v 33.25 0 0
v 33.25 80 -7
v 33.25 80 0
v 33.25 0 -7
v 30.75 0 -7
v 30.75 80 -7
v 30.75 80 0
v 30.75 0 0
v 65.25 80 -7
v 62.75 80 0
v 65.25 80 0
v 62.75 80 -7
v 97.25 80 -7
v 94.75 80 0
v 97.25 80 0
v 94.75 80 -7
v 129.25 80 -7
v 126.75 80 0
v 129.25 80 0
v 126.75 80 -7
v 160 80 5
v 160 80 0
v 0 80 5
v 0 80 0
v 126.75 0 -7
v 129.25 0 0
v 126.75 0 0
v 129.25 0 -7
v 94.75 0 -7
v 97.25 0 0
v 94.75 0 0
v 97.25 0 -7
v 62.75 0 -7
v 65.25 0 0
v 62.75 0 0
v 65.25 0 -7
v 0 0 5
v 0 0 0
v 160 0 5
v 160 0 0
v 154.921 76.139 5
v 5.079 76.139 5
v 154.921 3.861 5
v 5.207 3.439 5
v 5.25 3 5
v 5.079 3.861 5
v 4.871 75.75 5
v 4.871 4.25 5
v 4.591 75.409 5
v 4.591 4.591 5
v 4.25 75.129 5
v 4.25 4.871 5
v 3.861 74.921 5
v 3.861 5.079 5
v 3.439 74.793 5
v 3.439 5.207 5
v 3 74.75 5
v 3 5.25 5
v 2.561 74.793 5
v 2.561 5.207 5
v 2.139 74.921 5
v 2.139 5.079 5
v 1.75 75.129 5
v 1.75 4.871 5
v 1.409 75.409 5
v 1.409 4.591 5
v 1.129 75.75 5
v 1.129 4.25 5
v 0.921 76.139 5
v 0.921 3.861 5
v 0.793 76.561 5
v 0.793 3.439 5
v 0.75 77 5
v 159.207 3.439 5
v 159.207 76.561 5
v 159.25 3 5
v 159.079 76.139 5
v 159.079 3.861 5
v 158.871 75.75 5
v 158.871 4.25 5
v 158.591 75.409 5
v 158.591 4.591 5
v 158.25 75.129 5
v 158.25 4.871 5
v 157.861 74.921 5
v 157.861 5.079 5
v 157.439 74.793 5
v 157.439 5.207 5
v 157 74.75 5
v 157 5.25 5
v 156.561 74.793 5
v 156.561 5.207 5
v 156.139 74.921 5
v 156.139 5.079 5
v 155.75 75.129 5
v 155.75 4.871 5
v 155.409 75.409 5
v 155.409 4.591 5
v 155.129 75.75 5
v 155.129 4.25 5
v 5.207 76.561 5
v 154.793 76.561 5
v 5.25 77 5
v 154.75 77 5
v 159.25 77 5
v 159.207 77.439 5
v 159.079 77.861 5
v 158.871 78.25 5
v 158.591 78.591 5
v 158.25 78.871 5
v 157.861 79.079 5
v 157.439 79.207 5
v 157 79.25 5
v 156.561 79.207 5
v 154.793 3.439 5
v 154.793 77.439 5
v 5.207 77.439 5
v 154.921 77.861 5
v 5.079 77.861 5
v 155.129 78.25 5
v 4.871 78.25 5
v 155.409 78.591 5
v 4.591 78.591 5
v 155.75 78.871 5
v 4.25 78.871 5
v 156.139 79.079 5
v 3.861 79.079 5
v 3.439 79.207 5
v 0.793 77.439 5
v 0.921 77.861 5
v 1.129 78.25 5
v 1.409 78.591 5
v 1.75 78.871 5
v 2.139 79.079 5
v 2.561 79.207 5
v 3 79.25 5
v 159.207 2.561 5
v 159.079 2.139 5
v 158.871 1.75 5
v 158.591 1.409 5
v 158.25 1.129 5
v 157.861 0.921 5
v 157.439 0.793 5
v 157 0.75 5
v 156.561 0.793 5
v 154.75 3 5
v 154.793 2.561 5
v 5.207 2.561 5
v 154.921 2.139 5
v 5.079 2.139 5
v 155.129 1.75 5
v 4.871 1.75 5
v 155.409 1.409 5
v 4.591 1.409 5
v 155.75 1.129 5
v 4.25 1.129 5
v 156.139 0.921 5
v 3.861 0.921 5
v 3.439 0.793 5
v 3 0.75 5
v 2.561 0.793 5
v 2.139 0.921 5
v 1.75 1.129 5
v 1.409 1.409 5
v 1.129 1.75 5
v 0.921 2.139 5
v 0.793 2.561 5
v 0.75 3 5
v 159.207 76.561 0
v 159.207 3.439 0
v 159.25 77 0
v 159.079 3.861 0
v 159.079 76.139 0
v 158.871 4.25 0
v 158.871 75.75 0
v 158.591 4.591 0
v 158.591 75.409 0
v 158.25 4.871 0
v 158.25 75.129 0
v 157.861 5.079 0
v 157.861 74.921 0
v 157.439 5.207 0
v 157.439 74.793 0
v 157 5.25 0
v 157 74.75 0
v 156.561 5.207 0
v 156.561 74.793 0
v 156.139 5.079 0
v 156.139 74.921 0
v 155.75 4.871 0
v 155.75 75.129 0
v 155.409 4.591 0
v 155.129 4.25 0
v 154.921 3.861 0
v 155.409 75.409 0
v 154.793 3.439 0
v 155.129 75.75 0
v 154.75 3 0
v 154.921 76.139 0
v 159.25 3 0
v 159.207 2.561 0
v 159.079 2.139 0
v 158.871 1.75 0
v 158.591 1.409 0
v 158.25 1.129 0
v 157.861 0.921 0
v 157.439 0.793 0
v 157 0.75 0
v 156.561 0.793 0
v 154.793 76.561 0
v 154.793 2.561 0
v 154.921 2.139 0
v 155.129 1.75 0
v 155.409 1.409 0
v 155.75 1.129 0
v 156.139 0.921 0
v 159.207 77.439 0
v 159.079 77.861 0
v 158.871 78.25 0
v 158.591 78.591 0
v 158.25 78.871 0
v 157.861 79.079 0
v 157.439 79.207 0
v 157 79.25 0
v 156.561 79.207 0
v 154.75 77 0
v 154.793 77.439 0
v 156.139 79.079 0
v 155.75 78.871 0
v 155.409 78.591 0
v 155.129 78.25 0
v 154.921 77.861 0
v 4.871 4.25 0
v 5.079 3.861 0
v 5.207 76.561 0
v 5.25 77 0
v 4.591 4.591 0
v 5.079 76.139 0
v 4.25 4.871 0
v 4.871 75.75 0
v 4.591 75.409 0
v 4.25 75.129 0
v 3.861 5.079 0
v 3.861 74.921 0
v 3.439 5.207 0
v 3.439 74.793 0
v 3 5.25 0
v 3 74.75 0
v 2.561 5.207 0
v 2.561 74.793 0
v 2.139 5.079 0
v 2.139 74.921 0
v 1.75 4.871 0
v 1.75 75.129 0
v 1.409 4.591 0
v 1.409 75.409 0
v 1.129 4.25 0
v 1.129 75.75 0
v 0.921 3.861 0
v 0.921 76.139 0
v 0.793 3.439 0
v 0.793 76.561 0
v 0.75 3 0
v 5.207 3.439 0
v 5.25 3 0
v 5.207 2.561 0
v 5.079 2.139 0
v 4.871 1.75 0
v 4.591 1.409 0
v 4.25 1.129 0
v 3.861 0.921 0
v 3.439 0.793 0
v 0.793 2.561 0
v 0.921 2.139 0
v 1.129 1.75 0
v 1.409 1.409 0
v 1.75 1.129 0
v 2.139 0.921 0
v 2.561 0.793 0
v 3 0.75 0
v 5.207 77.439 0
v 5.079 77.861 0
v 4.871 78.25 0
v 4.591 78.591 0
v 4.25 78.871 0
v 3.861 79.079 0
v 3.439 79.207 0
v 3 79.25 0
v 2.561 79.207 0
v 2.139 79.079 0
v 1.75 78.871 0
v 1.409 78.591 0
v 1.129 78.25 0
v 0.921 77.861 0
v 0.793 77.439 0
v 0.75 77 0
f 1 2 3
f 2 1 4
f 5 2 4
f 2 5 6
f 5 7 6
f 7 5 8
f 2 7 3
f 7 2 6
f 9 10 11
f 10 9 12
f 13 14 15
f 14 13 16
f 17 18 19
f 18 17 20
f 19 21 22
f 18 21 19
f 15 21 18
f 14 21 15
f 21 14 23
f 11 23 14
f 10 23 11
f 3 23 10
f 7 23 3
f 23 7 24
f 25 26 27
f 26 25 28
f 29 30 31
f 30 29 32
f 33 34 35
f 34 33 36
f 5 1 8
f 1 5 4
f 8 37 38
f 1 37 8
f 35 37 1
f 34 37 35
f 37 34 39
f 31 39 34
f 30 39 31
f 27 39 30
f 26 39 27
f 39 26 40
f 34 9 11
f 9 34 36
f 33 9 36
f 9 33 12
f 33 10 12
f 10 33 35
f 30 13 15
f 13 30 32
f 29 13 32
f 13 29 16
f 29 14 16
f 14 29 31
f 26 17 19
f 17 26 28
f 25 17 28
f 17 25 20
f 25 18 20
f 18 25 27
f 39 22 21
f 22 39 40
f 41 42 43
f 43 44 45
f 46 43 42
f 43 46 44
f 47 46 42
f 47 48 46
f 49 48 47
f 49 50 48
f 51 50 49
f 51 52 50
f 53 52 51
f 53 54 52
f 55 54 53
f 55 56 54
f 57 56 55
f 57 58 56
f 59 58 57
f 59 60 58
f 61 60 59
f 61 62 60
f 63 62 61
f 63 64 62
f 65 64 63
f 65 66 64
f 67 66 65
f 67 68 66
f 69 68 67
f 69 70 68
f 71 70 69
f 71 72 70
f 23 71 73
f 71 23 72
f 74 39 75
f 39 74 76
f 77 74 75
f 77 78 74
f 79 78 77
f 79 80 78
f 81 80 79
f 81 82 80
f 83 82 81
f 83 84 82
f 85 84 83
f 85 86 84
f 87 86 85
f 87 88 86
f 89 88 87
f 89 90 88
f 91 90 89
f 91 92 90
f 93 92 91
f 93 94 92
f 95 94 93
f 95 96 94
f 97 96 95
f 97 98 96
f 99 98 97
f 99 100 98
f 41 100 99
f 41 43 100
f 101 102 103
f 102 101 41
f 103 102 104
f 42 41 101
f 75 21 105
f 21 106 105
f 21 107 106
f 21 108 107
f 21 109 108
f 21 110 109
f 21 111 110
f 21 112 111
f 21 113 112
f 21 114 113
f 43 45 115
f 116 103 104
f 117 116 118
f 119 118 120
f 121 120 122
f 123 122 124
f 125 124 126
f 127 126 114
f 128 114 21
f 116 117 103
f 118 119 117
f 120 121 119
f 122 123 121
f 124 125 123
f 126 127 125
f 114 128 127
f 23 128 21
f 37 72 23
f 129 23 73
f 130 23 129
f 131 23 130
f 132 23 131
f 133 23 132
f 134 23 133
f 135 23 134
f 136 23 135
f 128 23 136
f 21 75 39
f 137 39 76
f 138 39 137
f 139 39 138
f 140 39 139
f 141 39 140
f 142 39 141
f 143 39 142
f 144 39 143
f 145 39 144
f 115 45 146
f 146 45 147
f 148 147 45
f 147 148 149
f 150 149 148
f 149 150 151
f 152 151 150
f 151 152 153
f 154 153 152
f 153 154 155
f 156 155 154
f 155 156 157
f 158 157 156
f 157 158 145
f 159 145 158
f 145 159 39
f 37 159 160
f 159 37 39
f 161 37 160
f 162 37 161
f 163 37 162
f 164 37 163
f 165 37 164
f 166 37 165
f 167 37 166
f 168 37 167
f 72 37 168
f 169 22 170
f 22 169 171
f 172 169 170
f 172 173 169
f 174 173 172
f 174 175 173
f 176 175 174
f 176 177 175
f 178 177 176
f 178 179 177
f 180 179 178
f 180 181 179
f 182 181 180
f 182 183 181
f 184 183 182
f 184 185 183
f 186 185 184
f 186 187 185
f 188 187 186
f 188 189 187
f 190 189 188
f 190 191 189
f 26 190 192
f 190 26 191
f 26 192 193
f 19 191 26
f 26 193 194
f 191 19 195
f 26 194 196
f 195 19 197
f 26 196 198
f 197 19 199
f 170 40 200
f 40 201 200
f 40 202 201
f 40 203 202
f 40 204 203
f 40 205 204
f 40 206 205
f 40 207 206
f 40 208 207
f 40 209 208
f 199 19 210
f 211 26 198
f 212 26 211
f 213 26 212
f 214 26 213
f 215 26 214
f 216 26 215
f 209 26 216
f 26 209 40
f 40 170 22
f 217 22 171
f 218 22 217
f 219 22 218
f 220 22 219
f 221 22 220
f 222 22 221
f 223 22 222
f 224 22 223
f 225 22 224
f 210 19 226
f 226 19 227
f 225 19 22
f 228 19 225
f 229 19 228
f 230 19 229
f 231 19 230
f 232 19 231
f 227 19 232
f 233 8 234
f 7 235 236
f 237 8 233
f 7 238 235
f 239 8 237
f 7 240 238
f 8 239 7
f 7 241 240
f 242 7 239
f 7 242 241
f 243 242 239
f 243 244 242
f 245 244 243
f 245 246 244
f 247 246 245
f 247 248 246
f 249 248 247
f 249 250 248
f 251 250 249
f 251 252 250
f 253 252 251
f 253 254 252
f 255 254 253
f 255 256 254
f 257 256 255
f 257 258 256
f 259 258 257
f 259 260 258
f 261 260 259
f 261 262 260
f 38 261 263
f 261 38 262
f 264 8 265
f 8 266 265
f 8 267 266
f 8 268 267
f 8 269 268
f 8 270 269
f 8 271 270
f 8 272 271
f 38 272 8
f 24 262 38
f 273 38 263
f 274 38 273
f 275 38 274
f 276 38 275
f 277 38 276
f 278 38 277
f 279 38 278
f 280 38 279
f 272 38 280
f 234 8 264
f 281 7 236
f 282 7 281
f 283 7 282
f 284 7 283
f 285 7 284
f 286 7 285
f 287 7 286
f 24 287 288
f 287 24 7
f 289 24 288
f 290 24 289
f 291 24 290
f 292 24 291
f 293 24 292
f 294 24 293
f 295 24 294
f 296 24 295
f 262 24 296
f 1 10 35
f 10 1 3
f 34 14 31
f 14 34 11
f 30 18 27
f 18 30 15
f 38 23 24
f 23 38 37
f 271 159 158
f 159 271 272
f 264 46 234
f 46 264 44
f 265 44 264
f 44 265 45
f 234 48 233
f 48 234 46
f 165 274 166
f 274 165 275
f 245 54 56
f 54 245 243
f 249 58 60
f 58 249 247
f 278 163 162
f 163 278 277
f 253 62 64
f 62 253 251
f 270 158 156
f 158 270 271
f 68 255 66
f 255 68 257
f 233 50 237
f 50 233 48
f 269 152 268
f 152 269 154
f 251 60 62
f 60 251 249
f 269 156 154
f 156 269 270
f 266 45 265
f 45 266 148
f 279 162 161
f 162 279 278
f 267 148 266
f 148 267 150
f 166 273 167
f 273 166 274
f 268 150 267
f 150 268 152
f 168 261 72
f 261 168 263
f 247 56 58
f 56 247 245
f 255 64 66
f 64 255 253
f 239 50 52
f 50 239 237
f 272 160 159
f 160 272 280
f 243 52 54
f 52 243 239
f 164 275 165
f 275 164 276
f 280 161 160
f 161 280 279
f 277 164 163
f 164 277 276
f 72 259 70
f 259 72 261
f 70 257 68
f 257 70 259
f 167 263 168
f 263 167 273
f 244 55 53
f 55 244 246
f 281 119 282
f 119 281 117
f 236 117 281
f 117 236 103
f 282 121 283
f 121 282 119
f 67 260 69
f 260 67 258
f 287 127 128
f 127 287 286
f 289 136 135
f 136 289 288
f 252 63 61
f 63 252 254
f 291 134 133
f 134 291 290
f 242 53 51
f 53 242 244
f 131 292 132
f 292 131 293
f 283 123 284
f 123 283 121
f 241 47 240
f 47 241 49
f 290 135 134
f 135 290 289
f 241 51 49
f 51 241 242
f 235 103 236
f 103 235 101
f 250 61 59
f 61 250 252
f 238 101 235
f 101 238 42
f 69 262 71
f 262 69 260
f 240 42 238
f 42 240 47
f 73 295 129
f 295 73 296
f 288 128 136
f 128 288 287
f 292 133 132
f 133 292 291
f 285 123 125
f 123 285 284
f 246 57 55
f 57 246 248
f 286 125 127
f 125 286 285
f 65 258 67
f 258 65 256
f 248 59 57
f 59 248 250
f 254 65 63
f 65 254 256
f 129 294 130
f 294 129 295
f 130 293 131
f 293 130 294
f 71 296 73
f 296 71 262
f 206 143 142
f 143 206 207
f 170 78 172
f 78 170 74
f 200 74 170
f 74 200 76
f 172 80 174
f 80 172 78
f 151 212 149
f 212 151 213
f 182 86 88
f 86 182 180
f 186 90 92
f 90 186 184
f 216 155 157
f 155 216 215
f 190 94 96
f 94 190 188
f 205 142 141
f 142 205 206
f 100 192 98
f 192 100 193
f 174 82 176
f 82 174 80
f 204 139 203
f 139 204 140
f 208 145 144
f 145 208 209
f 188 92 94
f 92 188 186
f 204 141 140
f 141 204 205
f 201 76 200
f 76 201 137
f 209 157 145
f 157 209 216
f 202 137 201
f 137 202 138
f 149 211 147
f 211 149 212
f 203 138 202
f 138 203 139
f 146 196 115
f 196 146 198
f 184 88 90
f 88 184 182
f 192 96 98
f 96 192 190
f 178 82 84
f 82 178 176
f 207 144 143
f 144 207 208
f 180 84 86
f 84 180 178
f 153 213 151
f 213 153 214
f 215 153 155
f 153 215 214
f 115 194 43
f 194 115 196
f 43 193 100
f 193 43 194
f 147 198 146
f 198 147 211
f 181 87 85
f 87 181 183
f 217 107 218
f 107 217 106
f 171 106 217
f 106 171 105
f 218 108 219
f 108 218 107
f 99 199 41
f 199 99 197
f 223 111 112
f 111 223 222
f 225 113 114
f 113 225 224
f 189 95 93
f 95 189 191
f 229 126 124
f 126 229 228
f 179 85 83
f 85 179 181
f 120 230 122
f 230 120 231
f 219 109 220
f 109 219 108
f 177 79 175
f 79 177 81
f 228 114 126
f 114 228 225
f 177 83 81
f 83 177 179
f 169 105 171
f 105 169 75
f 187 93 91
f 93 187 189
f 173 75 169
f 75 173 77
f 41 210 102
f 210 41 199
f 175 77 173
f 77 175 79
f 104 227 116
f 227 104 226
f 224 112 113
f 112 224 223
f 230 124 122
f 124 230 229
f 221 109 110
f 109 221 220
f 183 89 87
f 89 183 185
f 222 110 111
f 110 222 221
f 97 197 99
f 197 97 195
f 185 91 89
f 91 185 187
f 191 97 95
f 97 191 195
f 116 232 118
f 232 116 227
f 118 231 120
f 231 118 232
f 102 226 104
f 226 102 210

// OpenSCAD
$fn = 32;

// ----------------------------------------------------------------------
// Enclosure lid: 160 x 80 x 5 mm, 4 bolt holes
// ----------------------------------------------------------------------

// --- parameters (mm) ---
length = 160;             // lid length, X
width = 80;               // lid width, Y
plate_t = 5;              // lid plate thickness
bolt_d = 4.5;             // bolt clearance
boss_lip = 3;             // bolt hole inset from the corner
sink = 1;                 // overlap of the lip and ribs into the plate
rib_n = 4;                // stiffening ribs
rib_t = 2.5;              // rib thickness
rib_h = 8;                // rib height below the plate

module plate() {
  cube([length, width, plate_t]);
  /* stiffening ribs under the plate */
  for (i = [1 : rib_n]) translate([length * i / (rib_n + 1) - rib_t / 2, 0, -rib_h + sink]) cube([rib_t, width - 2 * 0, rib_h]);
}

difference() {
  plate();
  /* bolt pattern matching the corner bosses */
  for (sx = [0, 1]) for (sy = [0, 1])
    translate([sx * (length - 2 * boss_lip) + boss_lip, sy * (width - 2 * boss_lip) + boss_lip, -0 - 1])
      cylinder(h = plate_t + 0 + 2, d = bolt_d);
}
